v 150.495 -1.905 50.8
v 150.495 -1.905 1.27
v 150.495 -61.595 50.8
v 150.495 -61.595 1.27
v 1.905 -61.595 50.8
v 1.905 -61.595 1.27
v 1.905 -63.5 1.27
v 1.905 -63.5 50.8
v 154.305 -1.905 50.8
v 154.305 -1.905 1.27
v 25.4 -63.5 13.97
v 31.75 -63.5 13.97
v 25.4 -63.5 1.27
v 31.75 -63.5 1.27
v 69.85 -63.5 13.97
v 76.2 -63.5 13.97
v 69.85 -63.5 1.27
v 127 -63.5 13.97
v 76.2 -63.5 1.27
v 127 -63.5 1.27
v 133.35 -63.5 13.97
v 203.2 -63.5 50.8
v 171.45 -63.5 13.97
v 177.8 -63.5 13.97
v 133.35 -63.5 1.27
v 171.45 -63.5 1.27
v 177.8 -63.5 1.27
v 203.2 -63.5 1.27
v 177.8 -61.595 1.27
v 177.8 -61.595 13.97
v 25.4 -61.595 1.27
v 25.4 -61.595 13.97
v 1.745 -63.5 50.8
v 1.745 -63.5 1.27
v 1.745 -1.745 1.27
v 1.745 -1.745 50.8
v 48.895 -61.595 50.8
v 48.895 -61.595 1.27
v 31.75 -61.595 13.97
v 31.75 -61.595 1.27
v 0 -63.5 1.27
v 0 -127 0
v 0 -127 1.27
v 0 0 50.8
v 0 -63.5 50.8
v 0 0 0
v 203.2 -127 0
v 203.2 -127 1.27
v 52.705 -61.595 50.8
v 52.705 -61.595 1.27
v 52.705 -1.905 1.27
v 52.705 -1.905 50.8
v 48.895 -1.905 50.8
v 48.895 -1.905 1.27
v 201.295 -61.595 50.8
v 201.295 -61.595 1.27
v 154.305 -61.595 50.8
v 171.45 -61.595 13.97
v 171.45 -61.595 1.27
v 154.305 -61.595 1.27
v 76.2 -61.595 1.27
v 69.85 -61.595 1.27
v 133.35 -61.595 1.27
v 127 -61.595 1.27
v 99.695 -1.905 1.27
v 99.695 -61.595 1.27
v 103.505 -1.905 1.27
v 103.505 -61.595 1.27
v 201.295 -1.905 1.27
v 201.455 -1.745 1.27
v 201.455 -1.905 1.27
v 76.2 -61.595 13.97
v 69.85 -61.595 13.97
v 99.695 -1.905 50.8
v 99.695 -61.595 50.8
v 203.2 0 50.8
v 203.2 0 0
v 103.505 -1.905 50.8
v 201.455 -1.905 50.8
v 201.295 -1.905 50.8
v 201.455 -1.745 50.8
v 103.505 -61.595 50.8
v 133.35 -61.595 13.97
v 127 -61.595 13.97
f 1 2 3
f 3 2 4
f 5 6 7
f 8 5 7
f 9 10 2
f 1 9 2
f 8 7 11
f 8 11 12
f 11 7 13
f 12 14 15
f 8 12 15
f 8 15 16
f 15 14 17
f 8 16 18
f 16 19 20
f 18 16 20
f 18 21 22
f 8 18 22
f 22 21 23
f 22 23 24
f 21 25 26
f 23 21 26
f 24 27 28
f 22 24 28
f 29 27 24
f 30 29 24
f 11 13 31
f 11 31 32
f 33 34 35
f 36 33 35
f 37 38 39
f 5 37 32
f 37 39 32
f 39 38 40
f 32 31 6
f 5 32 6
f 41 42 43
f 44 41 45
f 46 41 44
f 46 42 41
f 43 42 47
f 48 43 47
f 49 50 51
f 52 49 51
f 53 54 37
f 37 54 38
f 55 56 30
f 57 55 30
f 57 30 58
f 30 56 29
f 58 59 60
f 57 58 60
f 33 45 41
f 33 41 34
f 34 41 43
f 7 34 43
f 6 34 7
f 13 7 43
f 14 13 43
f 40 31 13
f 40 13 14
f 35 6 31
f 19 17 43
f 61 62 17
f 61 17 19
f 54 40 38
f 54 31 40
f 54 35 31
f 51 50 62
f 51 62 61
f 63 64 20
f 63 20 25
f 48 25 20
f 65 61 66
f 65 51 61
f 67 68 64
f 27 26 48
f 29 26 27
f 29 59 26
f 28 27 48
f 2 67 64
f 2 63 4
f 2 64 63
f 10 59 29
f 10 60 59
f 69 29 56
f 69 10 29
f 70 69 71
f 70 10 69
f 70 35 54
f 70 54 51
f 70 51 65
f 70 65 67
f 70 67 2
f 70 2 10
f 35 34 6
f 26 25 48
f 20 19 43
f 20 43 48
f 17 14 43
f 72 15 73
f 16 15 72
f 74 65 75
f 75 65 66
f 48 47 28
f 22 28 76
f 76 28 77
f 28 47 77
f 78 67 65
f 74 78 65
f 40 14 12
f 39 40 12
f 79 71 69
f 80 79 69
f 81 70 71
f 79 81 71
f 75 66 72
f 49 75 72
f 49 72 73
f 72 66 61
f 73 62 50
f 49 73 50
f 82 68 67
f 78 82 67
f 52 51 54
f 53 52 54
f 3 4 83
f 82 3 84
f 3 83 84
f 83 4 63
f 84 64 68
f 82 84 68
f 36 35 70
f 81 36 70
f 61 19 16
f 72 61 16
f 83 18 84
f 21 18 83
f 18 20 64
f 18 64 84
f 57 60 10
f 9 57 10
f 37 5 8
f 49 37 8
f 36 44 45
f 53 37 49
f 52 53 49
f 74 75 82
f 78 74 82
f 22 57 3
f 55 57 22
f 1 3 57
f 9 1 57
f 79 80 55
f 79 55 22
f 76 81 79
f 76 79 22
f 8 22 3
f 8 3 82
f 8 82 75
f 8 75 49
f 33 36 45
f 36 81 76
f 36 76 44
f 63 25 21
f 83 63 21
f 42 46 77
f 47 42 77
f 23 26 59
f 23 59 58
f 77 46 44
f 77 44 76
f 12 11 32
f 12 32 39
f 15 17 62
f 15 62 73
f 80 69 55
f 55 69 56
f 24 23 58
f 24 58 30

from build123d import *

# Parameters (mm, degrees)
F0_W     = 203.2
F0_H     = 127
F1_DEPTH = 1.27
F2_W     = 1.7448549651
F2_H     = 61.595
F2_W_2   = 46.99
F2_H_2   = 1.7448549651
F2_W_3   = 1.905
F2_W_4   = 47.1501450349
F2_H_3   = 1.905
F3_DEPTH = 50.8
F4_W     = 6.35
F4_H     = 12.7
F5_DEPTH = 25.4


with BuildPart() as f1:
    # F0 (on Top) → F1 (new body)
    with BuildSketch(Plane.XY):
        with Locations((101.6, -63.5)):
            Rectangle(F0_W, F0_H)
    extrude(amount=F1_DEPTH)

    # F2 (on Top) → F3 (join)
    with BuildSketch(Plane.XY):
        Polygon((50.8, -1.905), (48.895, -1.905), (48.895, -61.595), (1.905, -61.595), (1.905, -63.5), (50.8, -63.5), align=None)
        Polygon((1.7448549651, -1.7448549651), (1.7448549651, 0), (0, 0), (0, -61.595), (1.7448549651, -61.595), align=None)
        Polygon((52.705, -1.905), (50.8, -1.905), (50.8, -63.5), (101.6, -63.5), (101.6, -1.905), (99.695, -1.905), (99.695, -61.595), (52.705, -61.595), align=None)
        Polygon((101.6, -1.905), (101.6, -63.5), (152.4, -63.5), (152.4, -1.905), (150.495, -1.905), (150.495, -61.595), (103.505, -61.595), (103.505, -1.905), align=None)
        Polygon((152.4, -1.905), (152.4, -63.5), (201.4551450349, -63.5), (201.4551450349, -1.905), (201.295, -1.905), (201.295, -61.595), (154.305, -61.595), (154.305, -1.905), align=None)
        with Locations((202.3275725174, -32.7025)):
            Rectangle(F2_W, F2_H)
        with Locations((177.8, -0.8724274826)):
            Rectangle(F2_W_2, F2_H_2)
        Polygon((201.4551450349, -1.7448549651), (201.4551450349, -1.905), (203.2, -1.905), (203.2, 0), (201.295, 0), (201.295, -1.7448549651), align=None)
        with Locations((127, -0.8724274826)):
            Rectangle(F2_W_2, F2_H_2)
        with Locations((151.4475, -0.8724274826)):
            Rectangle(F2_W_3, F2_H_2)
        with Locations((153.3525, -0.8724274826)):
            Rectangle(F2_W_3, F2_H_2)
        with Locations((76.2, -0.8724274826)):
            Rectangle(F2_W_2, F2_H_2)
        with Locations((100.6475, -0.8724274826)):
            Rectangle(F2_W_3, F2_H_2)
        with Locations((102.5525, -0.8724274826)):
            Rectangle(F2_W_3, F2_H_2)
        with Locations((49.8475, -0.8724274826)):
            Rectangle(F2_W_3, F2_H_2)
        with Locations((51.7525, -0.8724274826)):
            Rectangle(F2_W_3, F2_H_2)
        with Locations((25.3199274826, -0.8724274826)):
            Rectangle(F2_W_4, F2_H_2)
        with Locations((0.8724274826, -62.5475)):
            Rectangle(F2_W, F2_H_3)
    extrude(amount=F3_DEPTH)

    # F4 (on face) → F5 (cut)
    with BuildSketch(Plane.XZ.offset(63.5)):
        with Locations((28.575, 7.62)):
            Rectangle(F4_W, F4_H)
        with Locations((73.025, 7.62)):
            Rectangle(F4_W, F4_H)
        with Locations((130.175, 7.62)):
            Rectangle(F4_W, F4_H)
        with Locations((174.625, 7.62)):
            Rectangle(F4_W, F4_H)
    extrude(amount=-F5_DEPTH, mode=Mode.SUBTRACT)


solid = f1.part
